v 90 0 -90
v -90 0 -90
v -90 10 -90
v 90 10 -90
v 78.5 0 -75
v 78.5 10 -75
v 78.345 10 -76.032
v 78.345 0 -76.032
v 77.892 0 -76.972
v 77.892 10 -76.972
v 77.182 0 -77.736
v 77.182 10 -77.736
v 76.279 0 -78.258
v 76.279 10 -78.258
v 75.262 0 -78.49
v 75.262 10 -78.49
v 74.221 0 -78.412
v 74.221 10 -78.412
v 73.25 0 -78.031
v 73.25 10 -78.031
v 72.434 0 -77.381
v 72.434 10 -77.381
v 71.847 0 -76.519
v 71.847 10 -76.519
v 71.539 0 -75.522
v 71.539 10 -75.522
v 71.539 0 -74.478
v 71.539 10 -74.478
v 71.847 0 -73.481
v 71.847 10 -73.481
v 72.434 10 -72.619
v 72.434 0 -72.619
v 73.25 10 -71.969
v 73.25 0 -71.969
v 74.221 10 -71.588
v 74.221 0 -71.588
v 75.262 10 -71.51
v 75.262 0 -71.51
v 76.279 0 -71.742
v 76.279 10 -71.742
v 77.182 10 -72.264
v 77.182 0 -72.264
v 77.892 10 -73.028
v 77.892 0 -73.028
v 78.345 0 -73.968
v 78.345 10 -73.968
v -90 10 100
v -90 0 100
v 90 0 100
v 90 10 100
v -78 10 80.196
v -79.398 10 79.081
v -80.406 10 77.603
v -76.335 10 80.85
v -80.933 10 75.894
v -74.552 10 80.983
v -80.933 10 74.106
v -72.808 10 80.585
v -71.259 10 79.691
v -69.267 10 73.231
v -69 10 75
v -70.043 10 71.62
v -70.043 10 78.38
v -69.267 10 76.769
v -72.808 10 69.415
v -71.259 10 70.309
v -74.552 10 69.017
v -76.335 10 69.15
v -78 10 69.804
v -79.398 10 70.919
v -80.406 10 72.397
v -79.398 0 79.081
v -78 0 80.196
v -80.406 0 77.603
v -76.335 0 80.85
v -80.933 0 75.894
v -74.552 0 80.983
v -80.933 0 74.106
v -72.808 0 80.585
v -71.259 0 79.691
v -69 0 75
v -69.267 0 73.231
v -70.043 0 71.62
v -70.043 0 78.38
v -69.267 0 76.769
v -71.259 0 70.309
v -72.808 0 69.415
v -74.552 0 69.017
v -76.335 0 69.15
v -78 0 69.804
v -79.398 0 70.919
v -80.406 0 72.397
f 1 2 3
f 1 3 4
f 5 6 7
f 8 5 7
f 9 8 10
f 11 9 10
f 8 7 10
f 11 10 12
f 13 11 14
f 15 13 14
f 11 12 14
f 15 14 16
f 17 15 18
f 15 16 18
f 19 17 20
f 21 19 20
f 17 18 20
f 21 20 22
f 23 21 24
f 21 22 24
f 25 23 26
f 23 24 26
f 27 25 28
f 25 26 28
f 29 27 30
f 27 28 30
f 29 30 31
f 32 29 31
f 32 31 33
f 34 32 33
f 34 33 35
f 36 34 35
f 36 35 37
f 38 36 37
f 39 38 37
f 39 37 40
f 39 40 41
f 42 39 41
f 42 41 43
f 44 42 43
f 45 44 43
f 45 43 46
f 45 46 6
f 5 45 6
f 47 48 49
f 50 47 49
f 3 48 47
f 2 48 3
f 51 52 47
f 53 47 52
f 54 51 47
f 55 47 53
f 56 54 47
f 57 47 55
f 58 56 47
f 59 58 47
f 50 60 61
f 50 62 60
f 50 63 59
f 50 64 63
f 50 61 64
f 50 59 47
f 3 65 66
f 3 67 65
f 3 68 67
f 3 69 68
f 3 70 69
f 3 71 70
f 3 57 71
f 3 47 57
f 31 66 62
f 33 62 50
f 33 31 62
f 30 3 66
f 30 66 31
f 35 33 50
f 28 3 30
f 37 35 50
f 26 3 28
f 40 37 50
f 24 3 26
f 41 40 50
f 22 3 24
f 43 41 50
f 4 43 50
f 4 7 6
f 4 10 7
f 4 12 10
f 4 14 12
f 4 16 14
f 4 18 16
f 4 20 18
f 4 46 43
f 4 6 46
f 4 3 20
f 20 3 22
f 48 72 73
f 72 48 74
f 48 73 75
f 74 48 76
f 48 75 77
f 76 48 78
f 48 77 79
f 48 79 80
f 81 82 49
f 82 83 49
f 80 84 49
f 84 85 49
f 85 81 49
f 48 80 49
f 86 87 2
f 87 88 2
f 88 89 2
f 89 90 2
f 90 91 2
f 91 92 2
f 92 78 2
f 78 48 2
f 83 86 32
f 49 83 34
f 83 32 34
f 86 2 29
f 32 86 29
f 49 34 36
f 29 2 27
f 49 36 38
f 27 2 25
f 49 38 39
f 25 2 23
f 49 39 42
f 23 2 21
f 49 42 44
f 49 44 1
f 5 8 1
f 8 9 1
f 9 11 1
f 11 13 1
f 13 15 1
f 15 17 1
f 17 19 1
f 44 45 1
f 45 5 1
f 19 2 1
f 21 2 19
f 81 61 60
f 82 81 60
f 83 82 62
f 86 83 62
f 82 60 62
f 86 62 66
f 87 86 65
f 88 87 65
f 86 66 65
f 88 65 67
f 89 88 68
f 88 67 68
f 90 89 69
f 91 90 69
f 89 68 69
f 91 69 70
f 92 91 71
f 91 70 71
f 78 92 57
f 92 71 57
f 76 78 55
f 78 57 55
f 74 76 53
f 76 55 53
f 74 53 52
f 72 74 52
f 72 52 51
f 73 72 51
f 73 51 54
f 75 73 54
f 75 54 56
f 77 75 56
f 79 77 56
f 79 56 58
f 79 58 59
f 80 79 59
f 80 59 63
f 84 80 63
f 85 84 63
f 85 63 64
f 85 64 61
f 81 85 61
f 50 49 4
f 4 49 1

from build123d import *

# Parameters (mm, degrees)
SKETCH1_W           = 180
SKETCH1_H           = 190
BOSS_EXTRUDE1_DEPTH = 10
SKETCH2_R           = 3.5
CUT_EXTRUDE1_DEPTH  = 11
SKETCH6_R           = 6
CUT_EXTRUDE2_DEPTH  = 11


with BuildPart() as part:
    # Sketch1 → Boss-Extrude1 (new body)
    with BuildSketch(Plane(origin=(0, 0, 0), x_dir=(1, 0, 0), z_dir=(0, 1, 0))):
        with Locations((0, -5)):
            Rectangle(SKETCH1_W, SKETCH1_H)
    extrude(amount=BOSS_EXTRUDE1_DEPTH)

    # Sketch2 → Cut-Extrude1 (cut, through all)
    with BuildSketch(Plane(origin=(0, 10, 0), x_dir=(1, 0, 0), z_dir=(0, 1, 0))):
        with Locations((75, 75)):
            Circle(SKETCH2_R)
    extrude(amount=-CUT_EXTRUDE1_DEPTH, mode=Mode.SUBTRACT)

    # Sketch6 → Cut-Extrude2 (cut, through all)
    with BuildSketch(Plane(origin=(0, 10, 0), x_dir=(1, 0, 0), z_dir=(0, 1, 0))):
        with Locations((-75, -75)):
            Circle(SKETCH6_R)
    extrude(amount=-CUT_EXTRUDE2_DEPTH, mode=Mode.SUBTRACT)


solid = part.part
